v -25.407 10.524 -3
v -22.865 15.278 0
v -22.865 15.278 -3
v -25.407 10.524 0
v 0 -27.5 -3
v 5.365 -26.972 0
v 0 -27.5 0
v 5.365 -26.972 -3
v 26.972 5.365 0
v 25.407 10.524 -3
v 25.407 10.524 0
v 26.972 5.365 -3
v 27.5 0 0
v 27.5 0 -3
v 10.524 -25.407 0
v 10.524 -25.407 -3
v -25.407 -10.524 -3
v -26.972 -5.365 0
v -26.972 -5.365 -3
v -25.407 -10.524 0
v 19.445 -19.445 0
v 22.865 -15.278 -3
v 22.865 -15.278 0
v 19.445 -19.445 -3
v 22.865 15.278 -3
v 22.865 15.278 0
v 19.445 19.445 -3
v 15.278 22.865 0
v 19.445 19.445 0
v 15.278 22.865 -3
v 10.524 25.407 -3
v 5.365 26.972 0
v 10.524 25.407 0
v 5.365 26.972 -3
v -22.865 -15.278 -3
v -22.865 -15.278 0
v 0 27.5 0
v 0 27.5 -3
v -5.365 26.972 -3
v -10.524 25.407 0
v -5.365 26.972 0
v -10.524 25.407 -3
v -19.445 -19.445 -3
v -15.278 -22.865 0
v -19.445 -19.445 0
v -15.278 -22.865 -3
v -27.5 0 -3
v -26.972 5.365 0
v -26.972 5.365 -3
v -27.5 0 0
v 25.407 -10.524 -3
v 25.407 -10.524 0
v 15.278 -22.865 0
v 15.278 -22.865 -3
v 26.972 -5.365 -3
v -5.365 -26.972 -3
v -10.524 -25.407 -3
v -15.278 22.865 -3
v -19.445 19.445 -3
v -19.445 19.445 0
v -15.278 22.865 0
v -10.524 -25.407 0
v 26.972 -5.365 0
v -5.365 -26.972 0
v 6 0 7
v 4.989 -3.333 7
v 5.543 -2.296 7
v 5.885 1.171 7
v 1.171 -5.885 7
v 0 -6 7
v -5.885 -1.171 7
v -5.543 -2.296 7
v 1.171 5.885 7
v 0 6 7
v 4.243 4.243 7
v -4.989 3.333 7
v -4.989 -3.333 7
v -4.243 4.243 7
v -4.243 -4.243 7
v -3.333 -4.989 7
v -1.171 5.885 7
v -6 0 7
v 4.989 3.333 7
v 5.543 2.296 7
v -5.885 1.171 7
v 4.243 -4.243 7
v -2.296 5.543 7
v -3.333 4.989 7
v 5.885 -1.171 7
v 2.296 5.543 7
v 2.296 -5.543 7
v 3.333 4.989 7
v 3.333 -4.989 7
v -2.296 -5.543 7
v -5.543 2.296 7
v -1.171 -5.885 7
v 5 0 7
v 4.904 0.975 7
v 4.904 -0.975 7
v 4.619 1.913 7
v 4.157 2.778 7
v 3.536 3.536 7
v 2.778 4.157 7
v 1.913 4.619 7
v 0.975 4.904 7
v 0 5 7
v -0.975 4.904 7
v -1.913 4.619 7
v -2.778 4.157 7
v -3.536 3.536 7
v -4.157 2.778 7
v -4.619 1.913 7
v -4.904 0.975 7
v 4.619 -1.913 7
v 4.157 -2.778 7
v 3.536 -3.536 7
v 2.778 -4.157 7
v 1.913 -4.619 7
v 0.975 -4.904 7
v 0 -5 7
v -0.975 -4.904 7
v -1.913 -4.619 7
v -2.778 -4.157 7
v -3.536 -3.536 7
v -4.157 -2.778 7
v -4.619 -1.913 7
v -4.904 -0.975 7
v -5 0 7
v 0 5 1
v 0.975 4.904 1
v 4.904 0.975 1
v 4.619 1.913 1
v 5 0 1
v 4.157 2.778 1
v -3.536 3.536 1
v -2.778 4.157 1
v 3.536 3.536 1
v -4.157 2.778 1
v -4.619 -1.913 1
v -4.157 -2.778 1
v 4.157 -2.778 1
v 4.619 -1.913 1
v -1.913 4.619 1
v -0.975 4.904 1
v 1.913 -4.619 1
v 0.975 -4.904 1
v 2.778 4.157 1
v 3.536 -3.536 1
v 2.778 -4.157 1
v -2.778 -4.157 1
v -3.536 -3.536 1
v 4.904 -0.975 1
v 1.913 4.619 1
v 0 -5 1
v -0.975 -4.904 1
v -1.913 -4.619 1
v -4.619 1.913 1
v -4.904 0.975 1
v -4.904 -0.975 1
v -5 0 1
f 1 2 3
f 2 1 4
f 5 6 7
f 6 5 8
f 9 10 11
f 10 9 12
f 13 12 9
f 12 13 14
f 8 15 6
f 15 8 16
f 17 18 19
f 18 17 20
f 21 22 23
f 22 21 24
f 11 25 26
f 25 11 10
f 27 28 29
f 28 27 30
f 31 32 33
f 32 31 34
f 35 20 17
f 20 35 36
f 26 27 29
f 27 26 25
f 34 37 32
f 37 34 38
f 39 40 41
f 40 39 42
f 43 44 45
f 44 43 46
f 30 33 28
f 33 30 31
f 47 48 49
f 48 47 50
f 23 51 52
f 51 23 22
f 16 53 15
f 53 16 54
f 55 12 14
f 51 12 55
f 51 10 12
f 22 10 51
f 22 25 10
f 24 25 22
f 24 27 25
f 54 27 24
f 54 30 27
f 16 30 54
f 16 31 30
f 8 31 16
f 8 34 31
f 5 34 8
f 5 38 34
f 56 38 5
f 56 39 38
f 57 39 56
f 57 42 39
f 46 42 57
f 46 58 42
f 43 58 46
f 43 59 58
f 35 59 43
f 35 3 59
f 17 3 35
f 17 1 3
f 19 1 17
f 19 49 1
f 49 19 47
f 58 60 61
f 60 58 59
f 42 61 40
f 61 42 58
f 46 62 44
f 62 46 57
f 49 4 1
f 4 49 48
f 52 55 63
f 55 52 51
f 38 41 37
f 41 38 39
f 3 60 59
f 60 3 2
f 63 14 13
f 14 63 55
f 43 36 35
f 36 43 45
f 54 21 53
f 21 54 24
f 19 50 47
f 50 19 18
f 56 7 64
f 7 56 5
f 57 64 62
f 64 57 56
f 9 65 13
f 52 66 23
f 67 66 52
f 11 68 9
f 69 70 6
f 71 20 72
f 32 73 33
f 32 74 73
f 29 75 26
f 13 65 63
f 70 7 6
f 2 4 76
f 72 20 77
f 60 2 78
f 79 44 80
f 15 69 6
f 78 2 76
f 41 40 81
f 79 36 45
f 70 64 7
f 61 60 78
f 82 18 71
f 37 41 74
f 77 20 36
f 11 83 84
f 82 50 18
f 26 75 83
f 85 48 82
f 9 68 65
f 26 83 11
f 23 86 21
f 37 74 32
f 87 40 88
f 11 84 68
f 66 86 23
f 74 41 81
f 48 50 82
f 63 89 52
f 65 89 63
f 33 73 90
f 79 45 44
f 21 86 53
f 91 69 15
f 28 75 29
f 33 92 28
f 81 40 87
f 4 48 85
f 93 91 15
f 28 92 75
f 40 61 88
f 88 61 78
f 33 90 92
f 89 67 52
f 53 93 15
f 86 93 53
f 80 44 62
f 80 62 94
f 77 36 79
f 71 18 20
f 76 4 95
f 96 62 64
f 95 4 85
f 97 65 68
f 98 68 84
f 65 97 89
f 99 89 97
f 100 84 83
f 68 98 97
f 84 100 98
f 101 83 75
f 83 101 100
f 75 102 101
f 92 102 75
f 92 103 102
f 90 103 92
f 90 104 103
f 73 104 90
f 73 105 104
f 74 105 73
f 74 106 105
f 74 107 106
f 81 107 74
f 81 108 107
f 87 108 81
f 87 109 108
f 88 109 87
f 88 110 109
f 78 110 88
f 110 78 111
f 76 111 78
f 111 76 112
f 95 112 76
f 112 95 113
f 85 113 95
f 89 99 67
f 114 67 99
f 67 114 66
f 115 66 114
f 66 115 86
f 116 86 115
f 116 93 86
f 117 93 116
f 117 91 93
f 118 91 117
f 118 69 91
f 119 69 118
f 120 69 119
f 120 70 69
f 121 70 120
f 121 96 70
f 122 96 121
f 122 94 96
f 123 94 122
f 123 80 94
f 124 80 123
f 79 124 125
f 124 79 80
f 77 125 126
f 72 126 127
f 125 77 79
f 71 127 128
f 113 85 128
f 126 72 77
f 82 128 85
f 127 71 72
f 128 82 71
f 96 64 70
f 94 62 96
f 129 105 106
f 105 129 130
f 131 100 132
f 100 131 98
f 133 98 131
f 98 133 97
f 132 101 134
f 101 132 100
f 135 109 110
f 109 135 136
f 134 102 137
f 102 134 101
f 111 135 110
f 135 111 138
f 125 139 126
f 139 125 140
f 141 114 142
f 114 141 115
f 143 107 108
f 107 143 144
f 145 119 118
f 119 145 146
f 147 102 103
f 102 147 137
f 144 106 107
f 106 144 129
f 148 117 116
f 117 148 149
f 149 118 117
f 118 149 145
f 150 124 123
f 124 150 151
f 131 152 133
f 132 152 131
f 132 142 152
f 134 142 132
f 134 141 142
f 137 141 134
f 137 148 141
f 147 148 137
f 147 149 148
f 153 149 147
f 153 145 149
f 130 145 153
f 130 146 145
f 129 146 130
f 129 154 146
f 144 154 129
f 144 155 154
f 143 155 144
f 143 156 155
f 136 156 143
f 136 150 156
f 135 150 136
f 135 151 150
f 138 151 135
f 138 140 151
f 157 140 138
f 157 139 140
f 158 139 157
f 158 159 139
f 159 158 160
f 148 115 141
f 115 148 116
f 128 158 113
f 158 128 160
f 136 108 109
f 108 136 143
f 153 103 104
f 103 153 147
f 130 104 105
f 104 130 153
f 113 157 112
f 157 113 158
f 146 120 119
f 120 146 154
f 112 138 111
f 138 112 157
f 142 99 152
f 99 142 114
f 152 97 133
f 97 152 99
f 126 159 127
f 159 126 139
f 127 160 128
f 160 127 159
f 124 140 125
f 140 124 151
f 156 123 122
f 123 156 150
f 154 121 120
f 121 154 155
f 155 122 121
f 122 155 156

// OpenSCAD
$fn = 32;

screw_d = 10;
screw_bottom_offset = 4;

h1 = 3;
h2 = 7;
d1 = 55;
d2 = screw_d + 2;

difference() {
  union() {
    translate([0, 0, -h1]) {
      cylinder(h = h1, d = d1);
    }

    cylinder(h = h2, d1 = d1, d2 = d2);
  }

  sh = (h1 + h2) - screw_bottom_offset + 0.01;
  echo(sh);
  so = -h1 + screw_bottom_offset;

  translate([0, 0, so]) {
    cylinder(h = sh, d = screw_d);
  }
}
